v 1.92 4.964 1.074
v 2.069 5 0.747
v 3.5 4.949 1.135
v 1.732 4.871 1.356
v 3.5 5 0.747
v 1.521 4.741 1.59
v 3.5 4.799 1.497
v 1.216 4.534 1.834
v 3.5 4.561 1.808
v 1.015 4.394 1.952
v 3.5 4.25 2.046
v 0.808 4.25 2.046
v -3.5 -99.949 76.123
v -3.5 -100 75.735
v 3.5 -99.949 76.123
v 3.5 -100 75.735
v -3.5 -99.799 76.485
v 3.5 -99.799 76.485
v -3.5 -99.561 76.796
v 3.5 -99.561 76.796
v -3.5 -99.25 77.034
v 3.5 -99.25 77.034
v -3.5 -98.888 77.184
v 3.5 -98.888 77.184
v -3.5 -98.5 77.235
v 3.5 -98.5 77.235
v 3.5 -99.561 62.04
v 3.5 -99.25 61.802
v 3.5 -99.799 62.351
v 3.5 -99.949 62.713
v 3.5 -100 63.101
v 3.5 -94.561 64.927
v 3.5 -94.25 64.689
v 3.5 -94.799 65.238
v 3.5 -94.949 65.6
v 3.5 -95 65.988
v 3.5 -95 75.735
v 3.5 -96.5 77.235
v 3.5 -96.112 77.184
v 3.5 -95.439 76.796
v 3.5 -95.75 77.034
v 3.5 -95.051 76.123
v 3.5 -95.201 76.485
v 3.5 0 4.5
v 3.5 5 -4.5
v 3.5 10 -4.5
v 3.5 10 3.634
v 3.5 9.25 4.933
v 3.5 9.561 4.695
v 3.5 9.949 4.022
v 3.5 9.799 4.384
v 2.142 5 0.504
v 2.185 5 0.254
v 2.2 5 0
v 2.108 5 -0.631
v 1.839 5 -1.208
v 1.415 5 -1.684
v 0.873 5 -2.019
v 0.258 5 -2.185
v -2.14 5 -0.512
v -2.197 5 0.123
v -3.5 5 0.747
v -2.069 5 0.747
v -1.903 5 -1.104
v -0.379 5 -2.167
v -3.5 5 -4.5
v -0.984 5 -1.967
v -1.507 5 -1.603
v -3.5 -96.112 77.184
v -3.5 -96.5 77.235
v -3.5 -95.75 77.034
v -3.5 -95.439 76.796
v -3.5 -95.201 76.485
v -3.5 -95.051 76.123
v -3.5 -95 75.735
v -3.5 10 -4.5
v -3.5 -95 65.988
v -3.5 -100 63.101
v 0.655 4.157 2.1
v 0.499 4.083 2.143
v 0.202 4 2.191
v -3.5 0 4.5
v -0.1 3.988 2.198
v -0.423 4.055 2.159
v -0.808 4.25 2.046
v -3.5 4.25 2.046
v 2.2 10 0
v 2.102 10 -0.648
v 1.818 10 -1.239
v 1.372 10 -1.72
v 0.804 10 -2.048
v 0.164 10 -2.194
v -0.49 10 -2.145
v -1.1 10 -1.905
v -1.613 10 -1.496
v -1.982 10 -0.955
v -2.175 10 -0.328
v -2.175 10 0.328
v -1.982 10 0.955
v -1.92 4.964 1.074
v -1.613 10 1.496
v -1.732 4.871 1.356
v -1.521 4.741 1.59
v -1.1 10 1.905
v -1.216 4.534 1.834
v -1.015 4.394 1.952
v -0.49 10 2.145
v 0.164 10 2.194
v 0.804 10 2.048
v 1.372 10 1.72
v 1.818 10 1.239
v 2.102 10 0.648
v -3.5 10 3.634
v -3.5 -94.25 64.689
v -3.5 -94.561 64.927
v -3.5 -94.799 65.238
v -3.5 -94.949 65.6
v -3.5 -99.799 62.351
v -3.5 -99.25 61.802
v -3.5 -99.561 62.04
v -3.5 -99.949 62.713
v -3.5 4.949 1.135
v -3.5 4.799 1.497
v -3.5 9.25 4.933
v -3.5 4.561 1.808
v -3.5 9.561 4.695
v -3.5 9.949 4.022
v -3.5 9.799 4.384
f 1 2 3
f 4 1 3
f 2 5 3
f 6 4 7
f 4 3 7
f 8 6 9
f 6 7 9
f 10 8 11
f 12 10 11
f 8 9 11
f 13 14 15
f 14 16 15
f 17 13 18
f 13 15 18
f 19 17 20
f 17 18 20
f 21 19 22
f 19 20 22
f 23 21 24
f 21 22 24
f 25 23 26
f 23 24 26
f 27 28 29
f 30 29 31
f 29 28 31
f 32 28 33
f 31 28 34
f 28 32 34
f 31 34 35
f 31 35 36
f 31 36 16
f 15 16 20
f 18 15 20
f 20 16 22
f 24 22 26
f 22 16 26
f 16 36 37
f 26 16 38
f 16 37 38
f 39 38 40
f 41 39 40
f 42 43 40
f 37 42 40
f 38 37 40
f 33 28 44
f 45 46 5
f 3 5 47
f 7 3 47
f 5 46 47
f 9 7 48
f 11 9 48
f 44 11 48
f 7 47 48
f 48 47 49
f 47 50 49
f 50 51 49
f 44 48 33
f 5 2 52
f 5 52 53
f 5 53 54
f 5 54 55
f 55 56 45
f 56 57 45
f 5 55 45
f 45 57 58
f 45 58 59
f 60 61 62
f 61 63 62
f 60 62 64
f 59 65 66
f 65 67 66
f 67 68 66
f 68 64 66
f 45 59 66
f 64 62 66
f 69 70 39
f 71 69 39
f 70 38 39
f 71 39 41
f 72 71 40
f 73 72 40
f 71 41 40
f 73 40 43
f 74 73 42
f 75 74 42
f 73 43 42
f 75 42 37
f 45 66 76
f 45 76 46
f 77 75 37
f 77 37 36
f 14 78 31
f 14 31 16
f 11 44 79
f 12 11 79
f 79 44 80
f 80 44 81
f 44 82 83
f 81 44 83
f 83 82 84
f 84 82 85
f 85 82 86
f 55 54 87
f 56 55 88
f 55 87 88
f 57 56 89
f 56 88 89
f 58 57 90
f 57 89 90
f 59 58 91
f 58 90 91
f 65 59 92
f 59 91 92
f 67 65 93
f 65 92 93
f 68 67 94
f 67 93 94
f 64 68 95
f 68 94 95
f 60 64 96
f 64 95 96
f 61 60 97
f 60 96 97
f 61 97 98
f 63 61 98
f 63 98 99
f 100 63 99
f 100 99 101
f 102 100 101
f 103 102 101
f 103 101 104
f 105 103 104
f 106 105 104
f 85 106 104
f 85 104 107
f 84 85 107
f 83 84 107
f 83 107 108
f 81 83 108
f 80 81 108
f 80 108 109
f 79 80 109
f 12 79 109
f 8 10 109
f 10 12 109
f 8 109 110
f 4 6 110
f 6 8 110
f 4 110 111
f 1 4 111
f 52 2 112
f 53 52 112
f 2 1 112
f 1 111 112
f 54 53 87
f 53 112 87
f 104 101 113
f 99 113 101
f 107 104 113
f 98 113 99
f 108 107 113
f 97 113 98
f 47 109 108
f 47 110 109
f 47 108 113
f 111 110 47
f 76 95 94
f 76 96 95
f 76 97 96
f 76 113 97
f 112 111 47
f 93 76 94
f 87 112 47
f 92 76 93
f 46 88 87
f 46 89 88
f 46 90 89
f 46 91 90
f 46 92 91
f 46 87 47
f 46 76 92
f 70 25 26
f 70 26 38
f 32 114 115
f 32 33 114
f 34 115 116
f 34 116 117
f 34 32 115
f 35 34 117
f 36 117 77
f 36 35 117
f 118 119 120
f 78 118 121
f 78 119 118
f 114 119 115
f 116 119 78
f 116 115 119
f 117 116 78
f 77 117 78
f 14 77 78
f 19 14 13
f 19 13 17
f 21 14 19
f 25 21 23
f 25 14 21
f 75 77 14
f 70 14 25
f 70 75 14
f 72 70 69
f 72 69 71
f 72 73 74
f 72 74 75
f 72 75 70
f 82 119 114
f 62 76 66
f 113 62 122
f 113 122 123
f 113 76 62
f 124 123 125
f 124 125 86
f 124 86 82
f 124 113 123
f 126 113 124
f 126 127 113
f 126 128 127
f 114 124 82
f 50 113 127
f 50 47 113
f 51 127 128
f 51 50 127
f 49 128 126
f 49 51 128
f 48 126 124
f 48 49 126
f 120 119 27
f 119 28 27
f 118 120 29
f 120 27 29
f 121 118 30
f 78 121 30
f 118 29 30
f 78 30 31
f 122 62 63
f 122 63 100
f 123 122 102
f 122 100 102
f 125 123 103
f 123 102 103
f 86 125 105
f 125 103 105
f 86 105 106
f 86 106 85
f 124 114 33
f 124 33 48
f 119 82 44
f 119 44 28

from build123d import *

# Parameters (mm, degrees)
SKETCH_1_W          = 7
SKETCH_1_H          = 9
EXTRUDE_1_DEPTH     = 10
SKETCH_2_R          = 2.2
CUT_EXTRUDE_1_DEPTH = 10
EXTRUDE_2_DEPTH     = 7
CUT_EXTRUDE_2_DEPTH = 7
FILLET_2_R          = 1.5
FILLET_3_R          = 1.5
FILLET_4_R          = 1.5


with BuildPart() as part:
    # 草图1 → 凸台-拉伸1 (new body)
    with BuildSketch(Plane(origin=(0, 0, 0), x_dir=(1, 0, 0), z_dir=(0, 1, 0))):
        Rectangle(SKETCH_1_W, SKETCH_1_H)
    extrude(amount=EXTRUDE_1_DEPTH)

    # 草图2 → 切除-拉伸1 (cut)
    with BuildSketch(Plane(origin=(0, 10, 0), x_dir=(1, 0, 0), z_dir=(0, 1, 0))):
        Circle(SKETCH_2_R)
    extrude(amount=-CUT_EXTRUDE_1_DEPTH, mode=Mode.SUBTRACT)

    # 草图3 → 凸台-拉伸2 (add)
    with BuildSketch(Plane.ZY.offset(3.5)):
        Polygon((4.5, 10), (4.5, 0), (62.235026919, -100), (77.235026919, -100), (77.235026919, -95), (65.121778265, -95), align=None)
    extrude(amount=-EXTRUDE_2_DEPTH)

    # 草图4 → 切除-拉伸2 (cut)
    with BuildSketch(Plane.ZY.offset(3.5)):
        Polygon((4.5, 0), (1.613248654, 5), (-4.5, 5), (-4.5, 0), align=None)
    extrude(amount=-CUT_EXTRUDE_2_DEPTH, mode=Mode.SUBTRACT)

    # 圆角2
    fillet_2_edges = [part.edges().sort_by_distance(p)[0] for p in [
        (0, 10, 4.5),
    ]]
    fillet(fillet_2_edges, radius=FILLET_2_R)

    # 圆角3
    fillet_3_edges = [part.edges().sort_by_distance(p)[0] for p in [
        (2.497901862, 5, 1.613248654),
        (-2.497901862, 5, 1.613248654),
    ]]
    fillet(fillet_3_edges, radius=FILLET_3_R)

    # 圆角4
    fillet_4_edges = [part.edges().sort_by_distance(p)[0] for p in [
        (0, -100, 77.235026919),
        (0, -100, 62.235026919),
        (0, -95, 65.121778265),
        (0, -95, 77.235026919),
    ]]
    fillet(fillet_4_edges, radius=FILLET_4_R)


solid = part.part
